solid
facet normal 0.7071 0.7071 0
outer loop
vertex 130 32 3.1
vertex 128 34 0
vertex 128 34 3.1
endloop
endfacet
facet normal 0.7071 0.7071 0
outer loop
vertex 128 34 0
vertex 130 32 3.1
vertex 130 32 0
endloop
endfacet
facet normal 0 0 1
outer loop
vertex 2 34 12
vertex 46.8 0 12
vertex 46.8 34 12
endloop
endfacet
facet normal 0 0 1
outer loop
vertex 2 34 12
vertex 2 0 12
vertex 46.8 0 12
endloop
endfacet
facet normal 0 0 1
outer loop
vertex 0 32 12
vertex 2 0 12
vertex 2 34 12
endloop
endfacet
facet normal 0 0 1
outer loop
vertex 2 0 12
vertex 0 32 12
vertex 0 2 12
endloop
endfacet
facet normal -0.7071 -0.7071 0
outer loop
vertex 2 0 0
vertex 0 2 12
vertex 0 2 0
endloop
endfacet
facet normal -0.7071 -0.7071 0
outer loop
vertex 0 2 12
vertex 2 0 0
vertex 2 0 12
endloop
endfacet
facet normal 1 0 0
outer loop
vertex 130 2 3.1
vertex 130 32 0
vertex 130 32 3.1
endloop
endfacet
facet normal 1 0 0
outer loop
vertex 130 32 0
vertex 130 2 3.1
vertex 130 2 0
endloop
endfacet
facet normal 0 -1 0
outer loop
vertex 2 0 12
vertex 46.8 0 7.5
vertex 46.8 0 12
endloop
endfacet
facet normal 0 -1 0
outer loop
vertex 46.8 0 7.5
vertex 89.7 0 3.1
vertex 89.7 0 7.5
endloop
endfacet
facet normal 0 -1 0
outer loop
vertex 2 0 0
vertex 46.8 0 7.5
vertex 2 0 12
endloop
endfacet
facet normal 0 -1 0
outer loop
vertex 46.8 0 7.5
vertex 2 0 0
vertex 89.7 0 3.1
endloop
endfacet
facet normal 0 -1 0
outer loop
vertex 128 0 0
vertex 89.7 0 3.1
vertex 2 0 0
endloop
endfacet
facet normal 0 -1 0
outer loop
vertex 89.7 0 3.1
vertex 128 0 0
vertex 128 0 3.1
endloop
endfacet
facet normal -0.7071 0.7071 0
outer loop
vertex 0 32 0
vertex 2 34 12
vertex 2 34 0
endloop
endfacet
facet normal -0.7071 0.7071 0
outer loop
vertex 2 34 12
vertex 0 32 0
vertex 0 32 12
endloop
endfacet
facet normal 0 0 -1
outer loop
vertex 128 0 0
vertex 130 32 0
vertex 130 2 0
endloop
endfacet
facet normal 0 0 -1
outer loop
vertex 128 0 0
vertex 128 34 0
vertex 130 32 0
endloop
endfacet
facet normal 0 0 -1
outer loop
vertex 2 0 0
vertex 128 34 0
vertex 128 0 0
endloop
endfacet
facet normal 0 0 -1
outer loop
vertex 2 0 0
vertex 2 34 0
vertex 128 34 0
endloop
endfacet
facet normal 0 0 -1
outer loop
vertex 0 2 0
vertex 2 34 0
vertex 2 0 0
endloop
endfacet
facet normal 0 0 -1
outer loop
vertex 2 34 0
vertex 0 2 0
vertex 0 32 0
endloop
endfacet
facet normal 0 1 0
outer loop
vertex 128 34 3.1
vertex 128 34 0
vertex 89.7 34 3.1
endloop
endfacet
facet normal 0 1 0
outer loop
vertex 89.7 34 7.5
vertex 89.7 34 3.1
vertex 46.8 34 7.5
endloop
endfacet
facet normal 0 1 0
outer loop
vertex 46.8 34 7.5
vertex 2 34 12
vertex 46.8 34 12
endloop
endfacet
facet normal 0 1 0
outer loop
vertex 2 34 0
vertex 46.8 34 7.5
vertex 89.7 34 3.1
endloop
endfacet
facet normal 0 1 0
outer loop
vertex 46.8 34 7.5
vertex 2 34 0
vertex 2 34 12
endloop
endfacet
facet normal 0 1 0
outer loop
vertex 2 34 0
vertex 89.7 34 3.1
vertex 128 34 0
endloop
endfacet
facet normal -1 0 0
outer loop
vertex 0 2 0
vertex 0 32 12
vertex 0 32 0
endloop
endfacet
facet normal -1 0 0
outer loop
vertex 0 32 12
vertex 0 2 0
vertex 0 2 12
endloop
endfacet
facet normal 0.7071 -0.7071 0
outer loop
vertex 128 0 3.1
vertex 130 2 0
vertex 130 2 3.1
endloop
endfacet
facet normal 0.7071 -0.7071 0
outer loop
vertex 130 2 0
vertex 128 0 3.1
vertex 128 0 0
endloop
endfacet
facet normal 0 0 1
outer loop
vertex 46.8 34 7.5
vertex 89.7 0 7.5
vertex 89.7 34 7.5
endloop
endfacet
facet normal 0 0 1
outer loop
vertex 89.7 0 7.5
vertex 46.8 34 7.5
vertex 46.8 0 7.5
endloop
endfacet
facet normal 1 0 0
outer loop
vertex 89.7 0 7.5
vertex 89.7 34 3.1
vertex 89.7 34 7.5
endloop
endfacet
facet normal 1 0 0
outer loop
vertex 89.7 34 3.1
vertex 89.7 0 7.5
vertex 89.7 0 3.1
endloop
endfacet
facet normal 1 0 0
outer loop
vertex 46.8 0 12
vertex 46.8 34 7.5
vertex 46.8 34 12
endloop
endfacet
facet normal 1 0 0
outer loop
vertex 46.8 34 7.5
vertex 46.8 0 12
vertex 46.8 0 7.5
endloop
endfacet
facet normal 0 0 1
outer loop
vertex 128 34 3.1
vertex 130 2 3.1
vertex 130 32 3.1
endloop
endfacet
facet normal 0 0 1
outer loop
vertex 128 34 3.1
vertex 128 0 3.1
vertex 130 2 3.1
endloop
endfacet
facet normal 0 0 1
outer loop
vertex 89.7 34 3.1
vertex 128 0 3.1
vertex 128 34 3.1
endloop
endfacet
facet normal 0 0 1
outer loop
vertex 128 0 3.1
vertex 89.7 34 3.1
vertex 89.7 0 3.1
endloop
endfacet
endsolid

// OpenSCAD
$fn = 32;

// ----------------------------------------------------------------------
// Stepped bar: twostep, 130 x 34 x 12/3.1 mm
// ----------------------------------------------------------------------

// --- parameters (mm) ---
bar_l = 130;              // bar length, X
bar_w = 34;               // bar width, Y
plate_t = 12;             // thickness of the thick zone, Z
thin_t = 3.1;             // thickness of the thin zone
corner_c = 2;             // corner chamfer of the bar
step_cut = 8.9;           // material removed from the thin zone
stair1_x = 46.8;          // position of the first stair
stair2_x = 89.7;          // position of the second stair
mid_t = 7.5;              // thickness of the middle zone
depth_1 = 4.5;            // depth of cut 1 from the top face
depth_2 = 8.9;            // depth of cut 2 from the top face

profile = [[2, 0], [128, 0], [130, 2], [130, 32], [128, 34], [2, 34], [0, 32], [0, 2]];  // primary outline, 8 points, counter clockwise
void_1 = [[46.8, -1], [89.7, -1], [89.7, 35], [46.8, 35]];  // first stair, 4 points
void_2 = [[89.7, -1], [131, -1], [131, 35], [89.7, 35]];  // second stair, 4 points

// --- the one profile operation ---
difference() {
  linear_extrude(height = plate_t) polygon(points = profile);
  translate([0, 0, plate_t - depth_1])
    linear_extrude(height = depth_1 + 1) polygon(points = void_1);
  translate([0, 0, plate_t - depth_2])
    linear_extrude(height = depth_2 + 1) polygon(points = void_2);
}
